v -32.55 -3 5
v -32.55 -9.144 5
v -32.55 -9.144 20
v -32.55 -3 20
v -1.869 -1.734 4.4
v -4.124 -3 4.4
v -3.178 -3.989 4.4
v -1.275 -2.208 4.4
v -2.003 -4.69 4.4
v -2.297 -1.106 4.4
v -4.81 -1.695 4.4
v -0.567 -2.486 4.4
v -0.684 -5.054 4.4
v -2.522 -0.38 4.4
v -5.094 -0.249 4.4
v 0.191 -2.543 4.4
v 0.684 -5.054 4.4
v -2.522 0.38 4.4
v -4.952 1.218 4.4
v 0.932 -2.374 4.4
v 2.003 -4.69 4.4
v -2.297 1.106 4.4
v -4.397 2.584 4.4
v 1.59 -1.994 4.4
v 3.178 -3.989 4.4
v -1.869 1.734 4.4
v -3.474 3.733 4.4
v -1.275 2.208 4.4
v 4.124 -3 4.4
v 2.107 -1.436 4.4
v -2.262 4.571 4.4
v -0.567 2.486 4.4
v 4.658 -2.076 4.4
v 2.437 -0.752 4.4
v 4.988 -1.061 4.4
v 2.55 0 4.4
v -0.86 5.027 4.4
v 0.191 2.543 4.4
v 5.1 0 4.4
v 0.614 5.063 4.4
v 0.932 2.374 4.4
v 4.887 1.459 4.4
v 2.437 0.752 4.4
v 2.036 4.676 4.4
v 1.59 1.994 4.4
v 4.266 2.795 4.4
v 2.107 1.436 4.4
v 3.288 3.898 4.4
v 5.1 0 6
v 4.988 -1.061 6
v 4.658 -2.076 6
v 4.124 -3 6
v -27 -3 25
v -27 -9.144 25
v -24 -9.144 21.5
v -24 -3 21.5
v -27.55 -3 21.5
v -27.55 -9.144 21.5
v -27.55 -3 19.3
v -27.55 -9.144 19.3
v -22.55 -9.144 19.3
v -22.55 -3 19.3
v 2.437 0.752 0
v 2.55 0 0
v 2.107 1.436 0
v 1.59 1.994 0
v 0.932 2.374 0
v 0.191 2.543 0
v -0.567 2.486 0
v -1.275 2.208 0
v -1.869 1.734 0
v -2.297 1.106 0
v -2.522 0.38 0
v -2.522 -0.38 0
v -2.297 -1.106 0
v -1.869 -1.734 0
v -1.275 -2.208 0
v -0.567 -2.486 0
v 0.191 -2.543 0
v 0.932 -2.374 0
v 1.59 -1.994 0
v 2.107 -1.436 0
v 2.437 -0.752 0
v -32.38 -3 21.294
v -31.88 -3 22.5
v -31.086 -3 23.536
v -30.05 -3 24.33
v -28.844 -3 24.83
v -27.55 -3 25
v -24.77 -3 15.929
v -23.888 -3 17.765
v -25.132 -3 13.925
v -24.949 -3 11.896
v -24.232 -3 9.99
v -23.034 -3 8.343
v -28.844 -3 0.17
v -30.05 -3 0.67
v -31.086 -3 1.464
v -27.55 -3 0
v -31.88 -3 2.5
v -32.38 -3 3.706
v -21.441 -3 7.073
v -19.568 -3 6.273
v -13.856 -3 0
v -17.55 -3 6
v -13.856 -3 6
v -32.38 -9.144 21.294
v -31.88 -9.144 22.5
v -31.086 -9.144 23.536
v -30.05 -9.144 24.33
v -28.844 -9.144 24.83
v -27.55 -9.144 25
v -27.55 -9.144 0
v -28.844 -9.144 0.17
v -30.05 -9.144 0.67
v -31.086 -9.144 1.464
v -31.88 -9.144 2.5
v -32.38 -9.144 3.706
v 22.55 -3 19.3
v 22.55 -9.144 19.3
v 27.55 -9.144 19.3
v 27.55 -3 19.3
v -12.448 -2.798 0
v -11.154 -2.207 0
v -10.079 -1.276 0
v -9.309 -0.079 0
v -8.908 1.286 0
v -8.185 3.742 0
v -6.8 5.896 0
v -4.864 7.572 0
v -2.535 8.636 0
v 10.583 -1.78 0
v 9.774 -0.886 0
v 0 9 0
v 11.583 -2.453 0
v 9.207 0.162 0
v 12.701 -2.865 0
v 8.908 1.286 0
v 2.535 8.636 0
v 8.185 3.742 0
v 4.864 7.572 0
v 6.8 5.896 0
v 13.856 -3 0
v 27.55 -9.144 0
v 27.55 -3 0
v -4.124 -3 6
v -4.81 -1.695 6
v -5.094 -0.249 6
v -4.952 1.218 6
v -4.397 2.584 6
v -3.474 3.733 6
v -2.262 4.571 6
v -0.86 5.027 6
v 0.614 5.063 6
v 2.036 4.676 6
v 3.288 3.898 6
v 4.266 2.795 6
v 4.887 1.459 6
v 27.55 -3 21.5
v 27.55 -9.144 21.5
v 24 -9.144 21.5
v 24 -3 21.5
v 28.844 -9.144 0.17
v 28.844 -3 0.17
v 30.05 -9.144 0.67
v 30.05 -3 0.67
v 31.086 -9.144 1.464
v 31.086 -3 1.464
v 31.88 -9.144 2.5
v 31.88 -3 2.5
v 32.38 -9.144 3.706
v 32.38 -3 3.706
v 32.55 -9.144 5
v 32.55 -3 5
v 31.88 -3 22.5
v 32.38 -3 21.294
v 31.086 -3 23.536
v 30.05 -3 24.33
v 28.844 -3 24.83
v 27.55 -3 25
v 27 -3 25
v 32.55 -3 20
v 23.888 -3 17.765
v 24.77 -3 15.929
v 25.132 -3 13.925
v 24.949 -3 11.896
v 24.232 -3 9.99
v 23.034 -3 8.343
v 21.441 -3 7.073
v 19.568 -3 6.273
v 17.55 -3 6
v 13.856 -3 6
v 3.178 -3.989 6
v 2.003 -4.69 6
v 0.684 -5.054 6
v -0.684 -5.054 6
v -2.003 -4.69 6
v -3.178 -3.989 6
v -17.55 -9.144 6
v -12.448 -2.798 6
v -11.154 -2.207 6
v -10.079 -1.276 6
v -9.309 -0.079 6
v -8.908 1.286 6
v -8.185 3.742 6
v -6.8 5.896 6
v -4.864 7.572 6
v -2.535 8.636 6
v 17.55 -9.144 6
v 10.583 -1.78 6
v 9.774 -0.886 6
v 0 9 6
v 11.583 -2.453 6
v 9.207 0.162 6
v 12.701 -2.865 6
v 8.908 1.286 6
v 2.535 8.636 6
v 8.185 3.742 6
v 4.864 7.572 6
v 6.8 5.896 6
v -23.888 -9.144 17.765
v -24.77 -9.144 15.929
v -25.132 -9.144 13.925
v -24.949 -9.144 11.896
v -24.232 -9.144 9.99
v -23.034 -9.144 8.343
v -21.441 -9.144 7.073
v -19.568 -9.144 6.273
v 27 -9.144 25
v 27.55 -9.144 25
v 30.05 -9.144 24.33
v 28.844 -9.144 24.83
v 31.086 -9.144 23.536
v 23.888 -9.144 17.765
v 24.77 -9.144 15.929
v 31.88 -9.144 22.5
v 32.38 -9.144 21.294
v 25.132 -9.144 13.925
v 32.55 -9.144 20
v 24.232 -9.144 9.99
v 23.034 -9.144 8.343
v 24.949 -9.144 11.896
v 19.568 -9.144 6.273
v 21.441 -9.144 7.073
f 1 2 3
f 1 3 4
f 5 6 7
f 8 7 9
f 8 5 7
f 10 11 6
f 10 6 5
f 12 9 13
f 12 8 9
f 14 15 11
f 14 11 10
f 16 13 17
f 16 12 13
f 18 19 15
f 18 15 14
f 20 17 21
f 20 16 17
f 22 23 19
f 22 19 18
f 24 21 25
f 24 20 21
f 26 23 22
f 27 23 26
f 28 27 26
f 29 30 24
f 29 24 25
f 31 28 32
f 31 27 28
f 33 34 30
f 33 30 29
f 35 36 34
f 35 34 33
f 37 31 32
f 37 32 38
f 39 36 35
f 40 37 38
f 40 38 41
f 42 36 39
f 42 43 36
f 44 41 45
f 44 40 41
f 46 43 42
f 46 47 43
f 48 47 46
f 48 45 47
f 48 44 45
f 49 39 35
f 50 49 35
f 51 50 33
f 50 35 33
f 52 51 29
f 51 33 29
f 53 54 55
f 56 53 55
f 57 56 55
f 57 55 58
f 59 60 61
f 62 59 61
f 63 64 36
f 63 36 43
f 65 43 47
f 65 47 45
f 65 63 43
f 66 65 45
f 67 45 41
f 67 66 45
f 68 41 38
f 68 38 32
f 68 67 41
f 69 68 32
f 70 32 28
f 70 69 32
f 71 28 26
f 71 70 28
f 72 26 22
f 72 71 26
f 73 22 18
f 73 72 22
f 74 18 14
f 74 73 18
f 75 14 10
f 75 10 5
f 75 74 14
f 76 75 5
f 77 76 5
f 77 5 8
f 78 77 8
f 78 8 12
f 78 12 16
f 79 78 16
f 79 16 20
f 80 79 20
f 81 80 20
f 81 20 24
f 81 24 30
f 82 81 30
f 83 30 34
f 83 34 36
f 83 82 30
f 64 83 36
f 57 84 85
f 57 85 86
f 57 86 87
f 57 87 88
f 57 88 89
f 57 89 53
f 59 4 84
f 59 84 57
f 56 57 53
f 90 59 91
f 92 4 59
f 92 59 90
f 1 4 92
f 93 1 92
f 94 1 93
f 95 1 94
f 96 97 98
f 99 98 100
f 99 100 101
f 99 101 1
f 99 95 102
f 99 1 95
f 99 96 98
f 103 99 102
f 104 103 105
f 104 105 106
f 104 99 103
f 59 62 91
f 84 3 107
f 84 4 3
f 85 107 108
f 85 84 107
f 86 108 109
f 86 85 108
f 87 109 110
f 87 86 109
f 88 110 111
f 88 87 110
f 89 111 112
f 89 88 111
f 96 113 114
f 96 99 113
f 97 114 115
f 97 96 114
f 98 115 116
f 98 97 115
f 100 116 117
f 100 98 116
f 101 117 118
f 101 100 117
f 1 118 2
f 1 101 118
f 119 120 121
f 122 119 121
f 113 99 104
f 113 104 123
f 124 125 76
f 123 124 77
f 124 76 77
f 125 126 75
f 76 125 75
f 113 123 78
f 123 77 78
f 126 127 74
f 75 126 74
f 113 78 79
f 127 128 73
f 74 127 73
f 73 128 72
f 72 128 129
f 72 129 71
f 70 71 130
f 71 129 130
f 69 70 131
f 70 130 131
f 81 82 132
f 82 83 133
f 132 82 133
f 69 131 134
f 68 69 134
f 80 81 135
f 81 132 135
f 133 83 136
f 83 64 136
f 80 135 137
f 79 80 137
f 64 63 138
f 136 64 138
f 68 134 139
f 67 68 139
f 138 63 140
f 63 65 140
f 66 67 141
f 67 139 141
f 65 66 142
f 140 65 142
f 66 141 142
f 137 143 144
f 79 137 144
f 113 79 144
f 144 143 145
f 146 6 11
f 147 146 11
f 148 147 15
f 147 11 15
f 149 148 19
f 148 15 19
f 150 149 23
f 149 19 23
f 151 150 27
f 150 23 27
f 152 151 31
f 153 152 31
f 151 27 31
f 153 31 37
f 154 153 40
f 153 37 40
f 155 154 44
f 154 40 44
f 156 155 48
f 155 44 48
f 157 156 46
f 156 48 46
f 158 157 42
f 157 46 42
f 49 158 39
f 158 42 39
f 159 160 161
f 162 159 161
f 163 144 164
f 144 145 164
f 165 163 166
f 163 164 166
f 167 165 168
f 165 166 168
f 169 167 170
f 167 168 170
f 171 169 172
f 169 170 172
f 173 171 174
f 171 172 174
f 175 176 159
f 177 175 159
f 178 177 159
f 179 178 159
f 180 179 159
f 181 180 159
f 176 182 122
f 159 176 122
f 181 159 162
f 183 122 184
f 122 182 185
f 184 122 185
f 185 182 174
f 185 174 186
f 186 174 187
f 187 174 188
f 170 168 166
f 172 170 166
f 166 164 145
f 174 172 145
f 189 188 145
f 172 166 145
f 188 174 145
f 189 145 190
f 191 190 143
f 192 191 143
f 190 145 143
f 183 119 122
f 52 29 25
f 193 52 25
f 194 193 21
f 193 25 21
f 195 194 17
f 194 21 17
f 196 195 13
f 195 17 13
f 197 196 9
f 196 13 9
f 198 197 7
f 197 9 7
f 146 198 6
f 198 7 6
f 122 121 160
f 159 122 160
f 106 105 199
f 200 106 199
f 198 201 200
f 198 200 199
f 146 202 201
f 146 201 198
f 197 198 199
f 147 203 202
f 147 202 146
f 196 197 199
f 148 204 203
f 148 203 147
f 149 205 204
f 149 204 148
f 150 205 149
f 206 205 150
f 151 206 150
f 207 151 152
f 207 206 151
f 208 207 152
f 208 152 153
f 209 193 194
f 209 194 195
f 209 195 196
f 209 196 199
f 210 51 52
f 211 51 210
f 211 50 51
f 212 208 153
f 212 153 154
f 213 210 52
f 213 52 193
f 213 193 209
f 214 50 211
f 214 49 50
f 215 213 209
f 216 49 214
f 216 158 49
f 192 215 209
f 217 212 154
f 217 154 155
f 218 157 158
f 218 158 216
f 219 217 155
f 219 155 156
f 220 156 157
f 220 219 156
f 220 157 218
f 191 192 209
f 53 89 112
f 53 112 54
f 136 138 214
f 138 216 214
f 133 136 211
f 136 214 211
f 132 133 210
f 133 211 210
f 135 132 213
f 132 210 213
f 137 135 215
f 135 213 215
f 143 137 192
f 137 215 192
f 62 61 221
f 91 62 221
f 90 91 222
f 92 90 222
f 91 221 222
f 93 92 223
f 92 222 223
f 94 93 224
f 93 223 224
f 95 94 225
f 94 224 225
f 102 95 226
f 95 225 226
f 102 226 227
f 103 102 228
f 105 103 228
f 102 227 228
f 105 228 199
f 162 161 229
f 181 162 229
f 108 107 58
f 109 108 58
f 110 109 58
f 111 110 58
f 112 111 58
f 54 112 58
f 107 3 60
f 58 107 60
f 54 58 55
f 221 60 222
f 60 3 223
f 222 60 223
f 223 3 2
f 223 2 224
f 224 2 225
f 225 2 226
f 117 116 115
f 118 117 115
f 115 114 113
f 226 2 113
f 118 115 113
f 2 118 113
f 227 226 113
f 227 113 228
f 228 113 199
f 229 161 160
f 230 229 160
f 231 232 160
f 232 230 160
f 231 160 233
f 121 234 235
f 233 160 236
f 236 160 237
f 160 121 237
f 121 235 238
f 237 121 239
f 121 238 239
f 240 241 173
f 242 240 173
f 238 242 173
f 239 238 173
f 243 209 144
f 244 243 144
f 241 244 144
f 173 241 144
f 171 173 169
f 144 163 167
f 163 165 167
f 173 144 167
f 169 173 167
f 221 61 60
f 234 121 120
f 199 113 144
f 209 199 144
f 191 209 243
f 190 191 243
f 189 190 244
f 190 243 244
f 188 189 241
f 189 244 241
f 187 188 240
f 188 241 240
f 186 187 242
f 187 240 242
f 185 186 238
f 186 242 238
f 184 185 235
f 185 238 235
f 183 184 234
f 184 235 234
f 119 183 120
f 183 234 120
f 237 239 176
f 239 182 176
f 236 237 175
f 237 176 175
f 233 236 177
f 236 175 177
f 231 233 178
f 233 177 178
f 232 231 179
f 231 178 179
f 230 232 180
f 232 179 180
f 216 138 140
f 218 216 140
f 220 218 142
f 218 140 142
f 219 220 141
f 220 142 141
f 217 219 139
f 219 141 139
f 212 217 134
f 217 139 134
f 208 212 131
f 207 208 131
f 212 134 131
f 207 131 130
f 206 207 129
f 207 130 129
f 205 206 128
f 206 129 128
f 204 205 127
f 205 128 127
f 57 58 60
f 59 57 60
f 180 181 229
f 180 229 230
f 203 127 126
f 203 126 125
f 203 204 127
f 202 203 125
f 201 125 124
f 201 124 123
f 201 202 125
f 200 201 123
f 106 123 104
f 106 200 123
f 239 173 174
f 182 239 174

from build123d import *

# Parameters (mm, degrees)
F1_DEPTH = 6
F0_W     = 10
F0_H     = 6.1438416846
F2_DEPTH = 25
F3_DEPTH = 6
F0_R     = 2.55
F4_DEPTH = 4.4
F5_R     = 5
F7_DEPTH = 10


with BuildPart() as f1:
    # F0 (on Top) → F1 (new body)
    with BuildSketch(Plane.XY):
        with BuildLine():
            ThreePointArc((8.4852813742, -3), (0, -9), (-8.4852813742, -3))
            Line((-8.4852813742, -3), (-22.55, -3))
            Line((-22.55, -3), (-22.55, -9.1438416846))
            Line((-22.55, -9.1438416846), (22.55, -9.1438416846))
            Line((22.55, -9.1438416846), (22.55, -3))
            Line((22.55, -3), (8.4852813742, -3))
        make_face()
    extrude(amount=F1_DEPTH)

    # F0 (on Top) → F2 (join)
    with BuildSketch(Plane.XY):
        with Locations((-27.55, -6.0719208423)):
            Rectangle(F0_W, F0_H)
        with Locations((27.55, -6.0719208423)):
            Rectangle(F0_W, F0_H)
    extrude(amount=F2_DEPTH)

    # F0 (on Top) → F3 (join)
    with BuildSketch(Plane.XY):
        with BuildLine():
            ThreePointArc((-4.1243181255, -3), (-1.5773359756, 4.84994961), (5.1, 0))
            ThreePointArc((5.1, 0), (4.84994961, -1.5773359756), (4.1243181255, -3))
            Line((4.1243181255, -3), (8.4852813742, -3))
            ThreePointArc((8.4852813742, -3), (8.8703870369, -1.5219178085), (9, 0))
            ThreePointArc((9, 0), (-1.5219178085, 8.8703870369), (-8.4852813742, -3))
            Line((-8.4852813742, -3), (-4.1243181255, -3))
        make_face()
        with BuildLine():
            ThreePointArc((4.1243181255, -3), (0, -5.1), (-4.1243181255, -3))
            Line((-4.1243181255, -3), (-8.4852813742, -3))
            ThreePointArc((-8.4852813742, -3), (0, -9), (8.4852813742, -3))
            Line((8.4852813742, -3), (4.1243181255, -3))
        make_face()
    extrude(amount=F3_DEPTH)

    # F0 (on Top) → F4 (join)
    with BuildSketch(Plane.XY):
        with BuildLine():
            ThreePointArc((4.1243181255, -3), (4.84994961, -1.5773359756), (5.1, 0))
            ThreePointArc((5.1, 0), (-1.5773359756, 4.84994961), (-4.1243181255, -3))
            Line((-4.1243181255, -3), (4.1243181255, -3))
        make_face()
        Circle(F0_R, mode=Mode.SUBTRACT)
        with BuildLine():
            Line((4.1243181255, -3), (-4.1243181255, -3))
            ThreePointArc((-4.1243181255, -3), (0, -5.1), (4.1243181255, -3))
        make_face()
    extrude(amount=F4_DEPTH)

    # F5
    f5_edges = [f1.edges().sort_by_distance(p)[0] for p in [
        (-8.485281, -3, 3),
        (8.485281, -3, 3),
        (22.55, -6.071921, 6),
        (-22.55, -6.071921, 6),
        (-32.55, -6.071921, 0),
        (32.55, -6.071921, 0),
        (32.55, -6.071921, 25),
        (-32.55, -6.071921, 25),
    ]]
    fillet(f5_edges, radius=F5_R)

    # F6 (on face) → F7 (cut)
    with BuildSketch(Plane.XZ.offset(9.1438416846)):
        Polygon((17.55, 19.3), (22.55, 19.3), (22.55, 21.5), (-22.55, 21.5), (-22.55, 19.3), (-17.55, 19.3), align=None)
        Polygon((-22.55, 19.3), (-22.55, 21.5), (-24, 21.5), (-27.55, 21.5), (-27.55, 19.3), align=None)
        Polygon((22.55, 19.3), (27.55, 19.3), (27.55, 21.5), (24, 21.5), (22.55, 21.5), align=None)
        Polygon((-24, 21.5), (-22.55, 21.5), (-22.55, 25), (-27, 25), align=None)
        Polygon((22.55, 25), (22.55, 21.5), (24, 21.5), (27, 25), align=None)
        with BuildLine():
            ThreePointArc((-22.55, 19.3), (-24.654400045, 10.9190225395), (-17.55, 6))
            ThreePointArc((-17.55, 6), (-21.0855339059, 7.4644660941), (-22.55, 11))
            Line((-22.55, 11), (-22.55, 19.3))
        make_face()
        with BuildLine():
            ThreePointArc((17.55, 6), (24.654400045, 10.9190225395), (22.55, 19.3))
            Line((22.55, 19.3), (22.55, 11))
            ThreePointArc((22.55, 11), (21.0855339059, 7.4644660941), (17.55, 6))
        make_face()
    extrude(amount=-F7_DEPTH, mode=Mode.SUBTRACT)


solid = f1.part
